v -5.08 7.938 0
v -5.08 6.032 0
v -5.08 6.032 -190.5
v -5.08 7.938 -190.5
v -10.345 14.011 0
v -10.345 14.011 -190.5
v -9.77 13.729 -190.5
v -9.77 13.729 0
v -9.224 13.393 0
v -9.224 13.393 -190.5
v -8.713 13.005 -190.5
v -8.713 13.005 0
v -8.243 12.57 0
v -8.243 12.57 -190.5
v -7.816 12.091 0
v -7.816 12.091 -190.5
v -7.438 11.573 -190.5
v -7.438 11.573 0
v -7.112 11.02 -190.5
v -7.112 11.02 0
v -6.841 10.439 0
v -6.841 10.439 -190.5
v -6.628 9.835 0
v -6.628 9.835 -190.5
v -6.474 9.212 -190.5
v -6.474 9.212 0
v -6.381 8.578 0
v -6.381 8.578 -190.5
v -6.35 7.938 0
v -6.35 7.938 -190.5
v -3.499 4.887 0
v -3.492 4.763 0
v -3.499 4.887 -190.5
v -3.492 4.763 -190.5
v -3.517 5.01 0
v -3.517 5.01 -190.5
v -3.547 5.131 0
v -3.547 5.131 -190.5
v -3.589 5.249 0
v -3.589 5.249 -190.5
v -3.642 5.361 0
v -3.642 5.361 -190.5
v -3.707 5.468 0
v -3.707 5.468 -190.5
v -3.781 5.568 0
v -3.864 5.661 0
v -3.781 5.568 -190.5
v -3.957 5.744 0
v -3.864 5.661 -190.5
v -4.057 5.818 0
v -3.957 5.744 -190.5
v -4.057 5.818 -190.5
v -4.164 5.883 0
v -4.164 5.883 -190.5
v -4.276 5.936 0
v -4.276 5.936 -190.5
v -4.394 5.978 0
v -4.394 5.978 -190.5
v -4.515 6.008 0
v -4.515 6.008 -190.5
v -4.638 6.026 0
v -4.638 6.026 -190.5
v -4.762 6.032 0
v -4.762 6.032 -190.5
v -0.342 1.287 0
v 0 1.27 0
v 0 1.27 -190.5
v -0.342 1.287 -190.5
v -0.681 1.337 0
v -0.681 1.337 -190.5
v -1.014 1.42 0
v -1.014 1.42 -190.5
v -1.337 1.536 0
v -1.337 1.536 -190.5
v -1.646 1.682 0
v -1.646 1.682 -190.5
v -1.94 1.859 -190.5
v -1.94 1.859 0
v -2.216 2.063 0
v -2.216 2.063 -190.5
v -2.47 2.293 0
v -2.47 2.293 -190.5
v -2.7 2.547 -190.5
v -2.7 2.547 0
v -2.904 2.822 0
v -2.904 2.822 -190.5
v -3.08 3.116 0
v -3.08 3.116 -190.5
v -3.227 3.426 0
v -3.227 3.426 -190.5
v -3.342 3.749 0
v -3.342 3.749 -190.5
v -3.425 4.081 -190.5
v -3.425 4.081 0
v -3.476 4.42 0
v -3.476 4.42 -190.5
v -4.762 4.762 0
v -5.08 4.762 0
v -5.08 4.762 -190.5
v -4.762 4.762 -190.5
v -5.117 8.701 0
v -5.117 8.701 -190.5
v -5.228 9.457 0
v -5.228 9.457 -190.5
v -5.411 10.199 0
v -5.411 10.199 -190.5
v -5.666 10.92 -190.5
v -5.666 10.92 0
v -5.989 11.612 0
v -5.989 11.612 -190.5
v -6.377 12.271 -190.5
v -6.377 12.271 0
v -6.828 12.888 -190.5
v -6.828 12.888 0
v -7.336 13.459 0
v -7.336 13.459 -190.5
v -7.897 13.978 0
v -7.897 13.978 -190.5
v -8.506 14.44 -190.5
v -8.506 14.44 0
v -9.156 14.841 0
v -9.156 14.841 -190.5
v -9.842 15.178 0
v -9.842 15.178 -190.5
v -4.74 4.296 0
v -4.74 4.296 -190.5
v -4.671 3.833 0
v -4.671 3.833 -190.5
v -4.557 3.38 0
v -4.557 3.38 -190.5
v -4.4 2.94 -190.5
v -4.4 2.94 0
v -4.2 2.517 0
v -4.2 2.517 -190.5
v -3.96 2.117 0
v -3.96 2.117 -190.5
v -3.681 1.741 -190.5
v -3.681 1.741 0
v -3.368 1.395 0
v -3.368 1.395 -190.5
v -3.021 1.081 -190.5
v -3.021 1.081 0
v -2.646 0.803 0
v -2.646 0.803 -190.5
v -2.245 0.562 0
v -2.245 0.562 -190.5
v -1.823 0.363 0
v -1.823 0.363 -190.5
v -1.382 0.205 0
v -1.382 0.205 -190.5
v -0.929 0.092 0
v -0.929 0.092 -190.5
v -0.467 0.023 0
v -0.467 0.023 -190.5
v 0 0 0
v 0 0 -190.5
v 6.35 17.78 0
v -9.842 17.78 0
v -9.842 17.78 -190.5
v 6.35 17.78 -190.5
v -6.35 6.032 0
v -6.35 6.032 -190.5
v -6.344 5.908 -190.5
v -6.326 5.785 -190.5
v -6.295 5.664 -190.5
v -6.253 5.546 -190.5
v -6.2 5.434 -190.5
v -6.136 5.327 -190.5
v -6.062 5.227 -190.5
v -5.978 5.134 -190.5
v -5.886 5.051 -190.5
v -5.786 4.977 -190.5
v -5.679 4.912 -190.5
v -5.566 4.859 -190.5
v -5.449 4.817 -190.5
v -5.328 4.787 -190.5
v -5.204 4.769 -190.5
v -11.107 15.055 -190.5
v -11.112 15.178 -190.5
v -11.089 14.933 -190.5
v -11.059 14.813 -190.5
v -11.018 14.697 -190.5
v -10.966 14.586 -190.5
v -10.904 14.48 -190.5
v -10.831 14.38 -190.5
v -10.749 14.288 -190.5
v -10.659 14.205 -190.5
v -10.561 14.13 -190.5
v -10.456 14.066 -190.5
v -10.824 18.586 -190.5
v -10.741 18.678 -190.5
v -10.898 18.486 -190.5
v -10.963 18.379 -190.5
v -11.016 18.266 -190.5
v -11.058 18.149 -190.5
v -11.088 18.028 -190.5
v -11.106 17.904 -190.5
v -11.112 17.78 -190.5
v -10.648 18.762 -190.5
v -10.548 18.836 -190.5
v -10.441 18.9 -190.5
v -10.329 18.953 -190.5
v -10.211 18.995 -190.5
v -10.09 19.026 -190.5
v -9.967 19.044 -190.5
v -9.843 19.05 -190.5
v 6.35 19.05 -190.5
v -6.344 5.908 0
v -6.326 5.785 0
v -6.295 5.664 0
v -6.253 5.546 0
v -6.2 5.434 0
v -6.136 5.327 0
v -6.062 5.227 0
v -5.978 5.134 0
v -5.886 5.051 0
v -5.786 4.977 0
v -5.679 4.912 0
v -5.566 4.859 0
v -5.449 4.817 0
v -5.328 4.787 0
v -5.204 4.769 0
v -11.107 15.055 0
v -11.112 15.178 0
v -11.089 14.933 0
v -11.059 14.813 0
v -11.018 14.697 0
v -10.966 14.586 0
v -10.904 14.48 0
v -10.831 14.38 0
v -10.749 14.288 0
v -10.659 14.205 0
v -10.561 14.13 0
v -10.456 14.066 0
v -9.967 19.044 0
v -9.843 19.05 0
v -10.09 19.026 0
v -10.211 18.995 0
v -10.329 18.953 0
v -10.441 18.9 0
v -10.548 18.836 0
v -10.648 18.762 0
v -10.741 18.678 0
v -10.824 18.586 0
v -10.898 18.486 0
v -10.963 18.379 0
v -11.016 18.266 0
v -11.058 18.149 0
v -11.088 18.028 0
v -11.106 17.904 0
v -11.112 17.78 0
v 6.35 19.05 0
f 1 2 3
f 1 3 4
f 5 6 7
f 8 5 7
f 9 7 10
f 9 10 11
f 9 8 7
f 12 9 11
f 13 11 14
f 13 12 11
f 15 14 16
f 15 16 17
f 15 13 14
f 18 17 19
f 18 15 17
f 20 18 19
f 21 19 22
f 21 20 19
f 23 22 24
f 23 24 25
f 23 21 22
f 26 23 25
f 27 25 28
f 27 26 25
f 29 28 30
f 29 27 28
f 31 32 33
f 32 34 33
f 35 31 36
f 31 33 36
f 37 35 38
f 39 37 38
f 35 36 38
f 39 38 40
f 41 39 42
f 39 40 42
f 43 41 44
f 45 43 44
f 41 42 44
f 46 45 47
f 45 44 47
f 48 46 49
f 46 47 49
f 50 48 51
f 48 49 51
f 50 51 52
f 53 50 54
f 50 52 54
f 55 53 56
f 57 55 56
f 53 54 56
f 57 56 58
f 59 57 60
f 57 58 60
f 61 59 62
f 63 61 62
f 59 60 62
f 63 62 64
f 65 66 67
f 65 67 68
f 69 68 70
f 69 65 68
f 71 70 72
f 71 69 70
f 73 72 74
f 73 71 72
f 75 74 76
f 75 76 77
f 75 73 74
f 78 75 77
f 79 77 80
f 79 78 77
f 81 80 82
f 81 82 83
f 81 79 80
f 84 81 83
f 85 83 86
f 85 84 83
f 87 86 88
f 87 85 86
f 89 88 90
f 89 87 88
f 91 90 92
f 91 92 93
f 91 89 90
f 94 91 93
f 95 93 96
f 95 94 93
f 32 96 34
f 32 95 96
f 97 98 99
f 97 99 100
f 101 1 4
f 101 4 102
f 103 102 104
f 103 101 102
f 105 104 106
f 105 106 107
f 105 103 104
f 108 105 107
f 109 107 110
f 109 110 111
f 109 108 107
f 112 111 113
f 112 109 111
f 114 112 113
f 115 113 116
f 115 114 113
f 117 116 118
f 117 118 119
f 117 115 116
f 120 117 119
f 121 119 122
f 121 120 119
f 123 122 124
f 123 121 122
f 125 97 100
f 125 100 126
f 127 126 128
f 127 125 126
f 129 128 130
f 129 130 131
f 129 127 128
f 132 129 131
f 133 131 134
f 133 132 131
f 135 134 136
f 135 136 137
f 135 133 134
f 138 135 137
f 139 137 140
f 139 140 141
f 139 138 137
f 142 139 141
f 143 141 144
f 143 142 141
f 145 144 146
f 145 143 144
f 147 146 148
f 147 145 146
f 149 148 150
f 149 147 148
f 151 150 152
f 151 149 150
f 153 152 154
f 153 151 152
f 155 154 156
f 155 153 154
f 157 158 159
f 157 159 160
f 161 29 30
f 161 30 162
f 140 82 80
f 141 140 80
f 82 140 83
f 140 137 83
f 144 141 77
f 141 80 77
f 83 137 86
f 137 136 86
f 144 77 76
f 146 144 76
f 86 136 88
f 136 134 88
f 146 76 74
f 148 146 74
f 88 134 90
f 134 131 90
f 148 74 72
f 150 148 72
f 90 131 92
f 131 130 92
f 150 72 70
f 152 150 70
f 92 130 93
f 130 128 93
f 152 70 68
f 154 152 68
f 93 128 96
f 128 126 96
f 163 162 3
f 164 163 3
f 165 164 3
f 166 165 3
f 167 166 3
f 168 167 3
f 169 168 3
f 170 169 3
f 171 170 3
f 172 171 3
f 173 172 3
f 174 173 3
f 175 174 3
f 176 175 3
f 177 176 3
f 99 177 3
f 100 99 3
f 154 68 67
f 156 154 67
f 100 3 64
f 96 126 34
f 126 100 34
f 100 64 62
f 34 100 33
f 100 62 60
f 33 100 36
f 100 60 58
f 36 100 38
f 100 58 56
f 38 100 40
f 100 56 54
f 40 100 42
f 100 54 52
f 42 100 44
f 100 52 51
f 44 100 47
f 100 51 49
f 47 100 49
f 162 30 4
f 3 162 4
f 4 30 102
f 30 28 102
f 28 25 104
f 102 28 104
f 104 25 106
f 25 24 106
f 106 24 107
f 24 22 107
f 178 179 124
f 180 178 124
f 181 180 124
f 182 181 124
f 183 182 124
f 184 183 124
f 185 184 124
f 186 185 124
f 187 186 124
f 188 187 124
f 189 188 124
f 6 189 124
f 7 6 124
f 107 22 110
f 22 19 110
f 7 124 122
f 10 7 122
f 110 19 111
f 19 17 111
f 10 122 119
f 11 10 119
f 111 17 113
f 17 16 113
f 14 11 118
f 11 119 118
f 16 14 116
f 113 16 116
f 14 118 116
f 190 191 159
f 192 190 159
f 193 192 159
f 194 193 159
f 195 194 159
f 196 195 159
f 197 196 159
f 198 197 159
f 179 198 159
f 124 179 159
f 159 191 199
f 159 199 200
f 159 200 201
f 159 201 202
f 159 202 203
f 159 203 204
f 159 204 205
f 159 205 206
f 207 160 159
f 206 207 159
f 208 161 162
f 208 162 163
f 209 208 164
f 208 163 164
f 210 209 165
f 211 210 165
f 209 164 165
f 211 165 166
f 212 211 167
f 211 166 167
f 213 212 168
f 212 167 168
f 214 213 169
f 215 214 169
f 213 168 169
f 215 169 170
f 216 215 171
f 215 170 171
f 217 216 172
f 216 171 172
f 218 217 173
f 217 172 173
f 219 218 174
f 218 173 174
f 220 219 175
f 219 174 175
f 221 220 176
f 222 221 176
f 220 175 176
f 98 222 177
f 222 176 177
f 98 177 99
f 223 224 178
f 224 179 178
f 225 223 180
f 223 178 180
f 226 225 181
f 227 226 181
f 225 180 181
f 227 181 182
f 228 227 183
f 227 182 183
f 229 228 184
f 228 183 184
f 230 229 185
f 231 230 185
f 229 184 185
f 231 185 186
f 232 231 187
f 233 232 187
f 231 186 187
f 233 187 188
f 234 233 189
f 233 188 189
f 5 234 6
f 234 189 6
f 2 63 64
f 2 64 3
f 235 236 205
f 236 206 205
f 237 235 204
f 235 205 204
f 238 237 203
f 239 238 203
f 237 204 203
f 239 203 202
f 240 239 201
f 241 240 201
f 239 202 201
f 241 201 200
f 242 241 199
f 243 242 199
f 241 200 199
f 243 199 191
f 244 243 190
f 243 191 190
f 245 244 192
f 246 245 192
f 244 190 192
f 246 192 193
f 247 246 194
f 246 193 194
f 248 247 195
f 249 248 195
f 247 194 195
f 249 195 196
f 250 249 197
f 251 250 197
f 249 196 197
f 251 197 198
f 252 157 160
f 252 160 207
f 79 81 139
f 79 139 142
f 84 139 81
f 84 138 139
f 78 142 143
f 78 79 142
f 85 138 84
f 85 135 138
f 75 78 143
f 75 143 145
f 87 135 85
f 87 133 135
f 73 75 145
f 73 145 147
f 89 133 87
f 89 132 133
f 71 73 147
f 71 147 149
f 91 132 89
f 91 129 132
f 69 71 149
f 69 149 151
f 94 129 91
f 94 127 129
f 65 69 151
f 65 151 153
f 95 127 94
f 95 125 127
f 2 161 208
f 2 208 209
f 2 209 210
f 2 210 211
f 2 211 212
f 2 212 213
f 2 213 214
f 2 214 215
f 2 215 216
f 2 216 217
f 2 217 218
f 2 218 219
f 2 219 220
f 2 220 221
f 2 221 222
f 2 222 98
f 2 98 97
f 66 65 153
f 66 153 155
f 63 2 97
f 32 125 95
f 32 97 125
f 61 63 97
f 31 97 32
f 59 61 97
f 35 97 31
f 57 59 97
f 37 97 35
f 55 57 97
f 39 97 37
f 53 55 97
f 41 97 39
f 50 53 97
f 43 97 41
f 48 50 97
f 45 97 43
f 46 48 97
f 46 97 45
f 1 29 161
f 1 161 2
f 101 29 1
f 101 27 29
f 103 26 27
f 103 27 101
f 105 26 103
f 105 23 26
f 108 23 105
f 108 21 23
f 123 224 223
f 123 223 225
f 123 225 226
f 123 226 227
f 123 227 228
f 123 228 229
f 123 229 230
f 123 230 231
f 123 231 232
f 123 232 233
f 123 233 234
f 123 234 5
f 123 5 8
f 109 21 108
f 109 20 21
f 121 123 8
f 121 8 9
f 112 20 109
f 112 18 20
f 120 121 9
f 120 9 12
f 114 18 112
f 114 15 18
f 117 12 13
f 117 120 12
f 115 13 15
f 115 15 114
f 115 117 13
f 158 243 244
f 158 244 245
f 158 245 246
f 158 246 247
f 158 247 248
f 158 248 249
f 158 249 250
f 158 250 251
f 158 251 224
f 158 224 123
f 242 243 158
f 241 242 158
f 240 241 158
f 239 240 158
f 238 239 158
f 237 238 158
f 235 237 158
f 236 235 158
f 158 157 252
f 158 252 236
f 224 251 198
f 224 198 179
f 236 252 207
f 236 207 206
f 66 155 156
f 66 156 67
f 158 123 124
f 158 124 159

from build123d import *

# Parameters (mm, degrees)
EXTRUDE_THIN1_DEPTH = 190.5
FILLET1_R           = 1.27


with BuildPart() as part:
    # Sketch1 → Extrude-Thin1 (new body)
    with BuildSketch(Plane.XY):
        with BuildLine():
            Line((6.35, 19.05), (-11.1125, 19.05))
            Line((-11.1125, 19.05), (-11.1125, 14.2875))
            ThreePointArc((-11.1125, 14.2875), (-7.672916667, 11.90625), (-6.35, 7.9375))
            Line((-6.35, 7.9375), (-6.35, 4.7625))
            Line((-6.35, 4.7625), (-4.7625, 4.7625))
            ThreePointArc((-4.7625, 4.7625), (-3.367596045, 1.394903955), (0, 0))
            Line((0, 0), (0, 1.27))
            ThreePointArc((0, 1.27), (-2.883836962, 2.792464309), (-3.253406868, 6.0325))
            Line((-3.253406868, 6.0325), (-5.08, 6.0325))
            Line((-5.08, 6.0325), (-5.08, 7.9375))
            ThreePointArc((-5.08, 7.9375), (-6.377361591, 12.27053174), (-9.8425, 15.177613949))
            Line((-9.8425, 15.177613949), (-9.8425, 17.78))
            Line((-9.8425, 17.78), (6.35, 17.78))
            Line((6.35, 17.78), (6.35, 19.05))
        make_face()
    extrude(amount=-EXTRUDE_THIN1_DEPTH)

    # Fillet1
    fillet1_edges = [part.edges().sort_by_distance(p)[0] for p in [
        (-6.35, 4.7625, -95.25),
        (-11.1125, 14.2875, -95.25),
        (-11.1125, 19.05, -95.25),
        (-3.253406868, 6.0325, -95.25),
    ]]
    fillet(fillet1_edges, radius=FILLET1_R)


solid = part.part
